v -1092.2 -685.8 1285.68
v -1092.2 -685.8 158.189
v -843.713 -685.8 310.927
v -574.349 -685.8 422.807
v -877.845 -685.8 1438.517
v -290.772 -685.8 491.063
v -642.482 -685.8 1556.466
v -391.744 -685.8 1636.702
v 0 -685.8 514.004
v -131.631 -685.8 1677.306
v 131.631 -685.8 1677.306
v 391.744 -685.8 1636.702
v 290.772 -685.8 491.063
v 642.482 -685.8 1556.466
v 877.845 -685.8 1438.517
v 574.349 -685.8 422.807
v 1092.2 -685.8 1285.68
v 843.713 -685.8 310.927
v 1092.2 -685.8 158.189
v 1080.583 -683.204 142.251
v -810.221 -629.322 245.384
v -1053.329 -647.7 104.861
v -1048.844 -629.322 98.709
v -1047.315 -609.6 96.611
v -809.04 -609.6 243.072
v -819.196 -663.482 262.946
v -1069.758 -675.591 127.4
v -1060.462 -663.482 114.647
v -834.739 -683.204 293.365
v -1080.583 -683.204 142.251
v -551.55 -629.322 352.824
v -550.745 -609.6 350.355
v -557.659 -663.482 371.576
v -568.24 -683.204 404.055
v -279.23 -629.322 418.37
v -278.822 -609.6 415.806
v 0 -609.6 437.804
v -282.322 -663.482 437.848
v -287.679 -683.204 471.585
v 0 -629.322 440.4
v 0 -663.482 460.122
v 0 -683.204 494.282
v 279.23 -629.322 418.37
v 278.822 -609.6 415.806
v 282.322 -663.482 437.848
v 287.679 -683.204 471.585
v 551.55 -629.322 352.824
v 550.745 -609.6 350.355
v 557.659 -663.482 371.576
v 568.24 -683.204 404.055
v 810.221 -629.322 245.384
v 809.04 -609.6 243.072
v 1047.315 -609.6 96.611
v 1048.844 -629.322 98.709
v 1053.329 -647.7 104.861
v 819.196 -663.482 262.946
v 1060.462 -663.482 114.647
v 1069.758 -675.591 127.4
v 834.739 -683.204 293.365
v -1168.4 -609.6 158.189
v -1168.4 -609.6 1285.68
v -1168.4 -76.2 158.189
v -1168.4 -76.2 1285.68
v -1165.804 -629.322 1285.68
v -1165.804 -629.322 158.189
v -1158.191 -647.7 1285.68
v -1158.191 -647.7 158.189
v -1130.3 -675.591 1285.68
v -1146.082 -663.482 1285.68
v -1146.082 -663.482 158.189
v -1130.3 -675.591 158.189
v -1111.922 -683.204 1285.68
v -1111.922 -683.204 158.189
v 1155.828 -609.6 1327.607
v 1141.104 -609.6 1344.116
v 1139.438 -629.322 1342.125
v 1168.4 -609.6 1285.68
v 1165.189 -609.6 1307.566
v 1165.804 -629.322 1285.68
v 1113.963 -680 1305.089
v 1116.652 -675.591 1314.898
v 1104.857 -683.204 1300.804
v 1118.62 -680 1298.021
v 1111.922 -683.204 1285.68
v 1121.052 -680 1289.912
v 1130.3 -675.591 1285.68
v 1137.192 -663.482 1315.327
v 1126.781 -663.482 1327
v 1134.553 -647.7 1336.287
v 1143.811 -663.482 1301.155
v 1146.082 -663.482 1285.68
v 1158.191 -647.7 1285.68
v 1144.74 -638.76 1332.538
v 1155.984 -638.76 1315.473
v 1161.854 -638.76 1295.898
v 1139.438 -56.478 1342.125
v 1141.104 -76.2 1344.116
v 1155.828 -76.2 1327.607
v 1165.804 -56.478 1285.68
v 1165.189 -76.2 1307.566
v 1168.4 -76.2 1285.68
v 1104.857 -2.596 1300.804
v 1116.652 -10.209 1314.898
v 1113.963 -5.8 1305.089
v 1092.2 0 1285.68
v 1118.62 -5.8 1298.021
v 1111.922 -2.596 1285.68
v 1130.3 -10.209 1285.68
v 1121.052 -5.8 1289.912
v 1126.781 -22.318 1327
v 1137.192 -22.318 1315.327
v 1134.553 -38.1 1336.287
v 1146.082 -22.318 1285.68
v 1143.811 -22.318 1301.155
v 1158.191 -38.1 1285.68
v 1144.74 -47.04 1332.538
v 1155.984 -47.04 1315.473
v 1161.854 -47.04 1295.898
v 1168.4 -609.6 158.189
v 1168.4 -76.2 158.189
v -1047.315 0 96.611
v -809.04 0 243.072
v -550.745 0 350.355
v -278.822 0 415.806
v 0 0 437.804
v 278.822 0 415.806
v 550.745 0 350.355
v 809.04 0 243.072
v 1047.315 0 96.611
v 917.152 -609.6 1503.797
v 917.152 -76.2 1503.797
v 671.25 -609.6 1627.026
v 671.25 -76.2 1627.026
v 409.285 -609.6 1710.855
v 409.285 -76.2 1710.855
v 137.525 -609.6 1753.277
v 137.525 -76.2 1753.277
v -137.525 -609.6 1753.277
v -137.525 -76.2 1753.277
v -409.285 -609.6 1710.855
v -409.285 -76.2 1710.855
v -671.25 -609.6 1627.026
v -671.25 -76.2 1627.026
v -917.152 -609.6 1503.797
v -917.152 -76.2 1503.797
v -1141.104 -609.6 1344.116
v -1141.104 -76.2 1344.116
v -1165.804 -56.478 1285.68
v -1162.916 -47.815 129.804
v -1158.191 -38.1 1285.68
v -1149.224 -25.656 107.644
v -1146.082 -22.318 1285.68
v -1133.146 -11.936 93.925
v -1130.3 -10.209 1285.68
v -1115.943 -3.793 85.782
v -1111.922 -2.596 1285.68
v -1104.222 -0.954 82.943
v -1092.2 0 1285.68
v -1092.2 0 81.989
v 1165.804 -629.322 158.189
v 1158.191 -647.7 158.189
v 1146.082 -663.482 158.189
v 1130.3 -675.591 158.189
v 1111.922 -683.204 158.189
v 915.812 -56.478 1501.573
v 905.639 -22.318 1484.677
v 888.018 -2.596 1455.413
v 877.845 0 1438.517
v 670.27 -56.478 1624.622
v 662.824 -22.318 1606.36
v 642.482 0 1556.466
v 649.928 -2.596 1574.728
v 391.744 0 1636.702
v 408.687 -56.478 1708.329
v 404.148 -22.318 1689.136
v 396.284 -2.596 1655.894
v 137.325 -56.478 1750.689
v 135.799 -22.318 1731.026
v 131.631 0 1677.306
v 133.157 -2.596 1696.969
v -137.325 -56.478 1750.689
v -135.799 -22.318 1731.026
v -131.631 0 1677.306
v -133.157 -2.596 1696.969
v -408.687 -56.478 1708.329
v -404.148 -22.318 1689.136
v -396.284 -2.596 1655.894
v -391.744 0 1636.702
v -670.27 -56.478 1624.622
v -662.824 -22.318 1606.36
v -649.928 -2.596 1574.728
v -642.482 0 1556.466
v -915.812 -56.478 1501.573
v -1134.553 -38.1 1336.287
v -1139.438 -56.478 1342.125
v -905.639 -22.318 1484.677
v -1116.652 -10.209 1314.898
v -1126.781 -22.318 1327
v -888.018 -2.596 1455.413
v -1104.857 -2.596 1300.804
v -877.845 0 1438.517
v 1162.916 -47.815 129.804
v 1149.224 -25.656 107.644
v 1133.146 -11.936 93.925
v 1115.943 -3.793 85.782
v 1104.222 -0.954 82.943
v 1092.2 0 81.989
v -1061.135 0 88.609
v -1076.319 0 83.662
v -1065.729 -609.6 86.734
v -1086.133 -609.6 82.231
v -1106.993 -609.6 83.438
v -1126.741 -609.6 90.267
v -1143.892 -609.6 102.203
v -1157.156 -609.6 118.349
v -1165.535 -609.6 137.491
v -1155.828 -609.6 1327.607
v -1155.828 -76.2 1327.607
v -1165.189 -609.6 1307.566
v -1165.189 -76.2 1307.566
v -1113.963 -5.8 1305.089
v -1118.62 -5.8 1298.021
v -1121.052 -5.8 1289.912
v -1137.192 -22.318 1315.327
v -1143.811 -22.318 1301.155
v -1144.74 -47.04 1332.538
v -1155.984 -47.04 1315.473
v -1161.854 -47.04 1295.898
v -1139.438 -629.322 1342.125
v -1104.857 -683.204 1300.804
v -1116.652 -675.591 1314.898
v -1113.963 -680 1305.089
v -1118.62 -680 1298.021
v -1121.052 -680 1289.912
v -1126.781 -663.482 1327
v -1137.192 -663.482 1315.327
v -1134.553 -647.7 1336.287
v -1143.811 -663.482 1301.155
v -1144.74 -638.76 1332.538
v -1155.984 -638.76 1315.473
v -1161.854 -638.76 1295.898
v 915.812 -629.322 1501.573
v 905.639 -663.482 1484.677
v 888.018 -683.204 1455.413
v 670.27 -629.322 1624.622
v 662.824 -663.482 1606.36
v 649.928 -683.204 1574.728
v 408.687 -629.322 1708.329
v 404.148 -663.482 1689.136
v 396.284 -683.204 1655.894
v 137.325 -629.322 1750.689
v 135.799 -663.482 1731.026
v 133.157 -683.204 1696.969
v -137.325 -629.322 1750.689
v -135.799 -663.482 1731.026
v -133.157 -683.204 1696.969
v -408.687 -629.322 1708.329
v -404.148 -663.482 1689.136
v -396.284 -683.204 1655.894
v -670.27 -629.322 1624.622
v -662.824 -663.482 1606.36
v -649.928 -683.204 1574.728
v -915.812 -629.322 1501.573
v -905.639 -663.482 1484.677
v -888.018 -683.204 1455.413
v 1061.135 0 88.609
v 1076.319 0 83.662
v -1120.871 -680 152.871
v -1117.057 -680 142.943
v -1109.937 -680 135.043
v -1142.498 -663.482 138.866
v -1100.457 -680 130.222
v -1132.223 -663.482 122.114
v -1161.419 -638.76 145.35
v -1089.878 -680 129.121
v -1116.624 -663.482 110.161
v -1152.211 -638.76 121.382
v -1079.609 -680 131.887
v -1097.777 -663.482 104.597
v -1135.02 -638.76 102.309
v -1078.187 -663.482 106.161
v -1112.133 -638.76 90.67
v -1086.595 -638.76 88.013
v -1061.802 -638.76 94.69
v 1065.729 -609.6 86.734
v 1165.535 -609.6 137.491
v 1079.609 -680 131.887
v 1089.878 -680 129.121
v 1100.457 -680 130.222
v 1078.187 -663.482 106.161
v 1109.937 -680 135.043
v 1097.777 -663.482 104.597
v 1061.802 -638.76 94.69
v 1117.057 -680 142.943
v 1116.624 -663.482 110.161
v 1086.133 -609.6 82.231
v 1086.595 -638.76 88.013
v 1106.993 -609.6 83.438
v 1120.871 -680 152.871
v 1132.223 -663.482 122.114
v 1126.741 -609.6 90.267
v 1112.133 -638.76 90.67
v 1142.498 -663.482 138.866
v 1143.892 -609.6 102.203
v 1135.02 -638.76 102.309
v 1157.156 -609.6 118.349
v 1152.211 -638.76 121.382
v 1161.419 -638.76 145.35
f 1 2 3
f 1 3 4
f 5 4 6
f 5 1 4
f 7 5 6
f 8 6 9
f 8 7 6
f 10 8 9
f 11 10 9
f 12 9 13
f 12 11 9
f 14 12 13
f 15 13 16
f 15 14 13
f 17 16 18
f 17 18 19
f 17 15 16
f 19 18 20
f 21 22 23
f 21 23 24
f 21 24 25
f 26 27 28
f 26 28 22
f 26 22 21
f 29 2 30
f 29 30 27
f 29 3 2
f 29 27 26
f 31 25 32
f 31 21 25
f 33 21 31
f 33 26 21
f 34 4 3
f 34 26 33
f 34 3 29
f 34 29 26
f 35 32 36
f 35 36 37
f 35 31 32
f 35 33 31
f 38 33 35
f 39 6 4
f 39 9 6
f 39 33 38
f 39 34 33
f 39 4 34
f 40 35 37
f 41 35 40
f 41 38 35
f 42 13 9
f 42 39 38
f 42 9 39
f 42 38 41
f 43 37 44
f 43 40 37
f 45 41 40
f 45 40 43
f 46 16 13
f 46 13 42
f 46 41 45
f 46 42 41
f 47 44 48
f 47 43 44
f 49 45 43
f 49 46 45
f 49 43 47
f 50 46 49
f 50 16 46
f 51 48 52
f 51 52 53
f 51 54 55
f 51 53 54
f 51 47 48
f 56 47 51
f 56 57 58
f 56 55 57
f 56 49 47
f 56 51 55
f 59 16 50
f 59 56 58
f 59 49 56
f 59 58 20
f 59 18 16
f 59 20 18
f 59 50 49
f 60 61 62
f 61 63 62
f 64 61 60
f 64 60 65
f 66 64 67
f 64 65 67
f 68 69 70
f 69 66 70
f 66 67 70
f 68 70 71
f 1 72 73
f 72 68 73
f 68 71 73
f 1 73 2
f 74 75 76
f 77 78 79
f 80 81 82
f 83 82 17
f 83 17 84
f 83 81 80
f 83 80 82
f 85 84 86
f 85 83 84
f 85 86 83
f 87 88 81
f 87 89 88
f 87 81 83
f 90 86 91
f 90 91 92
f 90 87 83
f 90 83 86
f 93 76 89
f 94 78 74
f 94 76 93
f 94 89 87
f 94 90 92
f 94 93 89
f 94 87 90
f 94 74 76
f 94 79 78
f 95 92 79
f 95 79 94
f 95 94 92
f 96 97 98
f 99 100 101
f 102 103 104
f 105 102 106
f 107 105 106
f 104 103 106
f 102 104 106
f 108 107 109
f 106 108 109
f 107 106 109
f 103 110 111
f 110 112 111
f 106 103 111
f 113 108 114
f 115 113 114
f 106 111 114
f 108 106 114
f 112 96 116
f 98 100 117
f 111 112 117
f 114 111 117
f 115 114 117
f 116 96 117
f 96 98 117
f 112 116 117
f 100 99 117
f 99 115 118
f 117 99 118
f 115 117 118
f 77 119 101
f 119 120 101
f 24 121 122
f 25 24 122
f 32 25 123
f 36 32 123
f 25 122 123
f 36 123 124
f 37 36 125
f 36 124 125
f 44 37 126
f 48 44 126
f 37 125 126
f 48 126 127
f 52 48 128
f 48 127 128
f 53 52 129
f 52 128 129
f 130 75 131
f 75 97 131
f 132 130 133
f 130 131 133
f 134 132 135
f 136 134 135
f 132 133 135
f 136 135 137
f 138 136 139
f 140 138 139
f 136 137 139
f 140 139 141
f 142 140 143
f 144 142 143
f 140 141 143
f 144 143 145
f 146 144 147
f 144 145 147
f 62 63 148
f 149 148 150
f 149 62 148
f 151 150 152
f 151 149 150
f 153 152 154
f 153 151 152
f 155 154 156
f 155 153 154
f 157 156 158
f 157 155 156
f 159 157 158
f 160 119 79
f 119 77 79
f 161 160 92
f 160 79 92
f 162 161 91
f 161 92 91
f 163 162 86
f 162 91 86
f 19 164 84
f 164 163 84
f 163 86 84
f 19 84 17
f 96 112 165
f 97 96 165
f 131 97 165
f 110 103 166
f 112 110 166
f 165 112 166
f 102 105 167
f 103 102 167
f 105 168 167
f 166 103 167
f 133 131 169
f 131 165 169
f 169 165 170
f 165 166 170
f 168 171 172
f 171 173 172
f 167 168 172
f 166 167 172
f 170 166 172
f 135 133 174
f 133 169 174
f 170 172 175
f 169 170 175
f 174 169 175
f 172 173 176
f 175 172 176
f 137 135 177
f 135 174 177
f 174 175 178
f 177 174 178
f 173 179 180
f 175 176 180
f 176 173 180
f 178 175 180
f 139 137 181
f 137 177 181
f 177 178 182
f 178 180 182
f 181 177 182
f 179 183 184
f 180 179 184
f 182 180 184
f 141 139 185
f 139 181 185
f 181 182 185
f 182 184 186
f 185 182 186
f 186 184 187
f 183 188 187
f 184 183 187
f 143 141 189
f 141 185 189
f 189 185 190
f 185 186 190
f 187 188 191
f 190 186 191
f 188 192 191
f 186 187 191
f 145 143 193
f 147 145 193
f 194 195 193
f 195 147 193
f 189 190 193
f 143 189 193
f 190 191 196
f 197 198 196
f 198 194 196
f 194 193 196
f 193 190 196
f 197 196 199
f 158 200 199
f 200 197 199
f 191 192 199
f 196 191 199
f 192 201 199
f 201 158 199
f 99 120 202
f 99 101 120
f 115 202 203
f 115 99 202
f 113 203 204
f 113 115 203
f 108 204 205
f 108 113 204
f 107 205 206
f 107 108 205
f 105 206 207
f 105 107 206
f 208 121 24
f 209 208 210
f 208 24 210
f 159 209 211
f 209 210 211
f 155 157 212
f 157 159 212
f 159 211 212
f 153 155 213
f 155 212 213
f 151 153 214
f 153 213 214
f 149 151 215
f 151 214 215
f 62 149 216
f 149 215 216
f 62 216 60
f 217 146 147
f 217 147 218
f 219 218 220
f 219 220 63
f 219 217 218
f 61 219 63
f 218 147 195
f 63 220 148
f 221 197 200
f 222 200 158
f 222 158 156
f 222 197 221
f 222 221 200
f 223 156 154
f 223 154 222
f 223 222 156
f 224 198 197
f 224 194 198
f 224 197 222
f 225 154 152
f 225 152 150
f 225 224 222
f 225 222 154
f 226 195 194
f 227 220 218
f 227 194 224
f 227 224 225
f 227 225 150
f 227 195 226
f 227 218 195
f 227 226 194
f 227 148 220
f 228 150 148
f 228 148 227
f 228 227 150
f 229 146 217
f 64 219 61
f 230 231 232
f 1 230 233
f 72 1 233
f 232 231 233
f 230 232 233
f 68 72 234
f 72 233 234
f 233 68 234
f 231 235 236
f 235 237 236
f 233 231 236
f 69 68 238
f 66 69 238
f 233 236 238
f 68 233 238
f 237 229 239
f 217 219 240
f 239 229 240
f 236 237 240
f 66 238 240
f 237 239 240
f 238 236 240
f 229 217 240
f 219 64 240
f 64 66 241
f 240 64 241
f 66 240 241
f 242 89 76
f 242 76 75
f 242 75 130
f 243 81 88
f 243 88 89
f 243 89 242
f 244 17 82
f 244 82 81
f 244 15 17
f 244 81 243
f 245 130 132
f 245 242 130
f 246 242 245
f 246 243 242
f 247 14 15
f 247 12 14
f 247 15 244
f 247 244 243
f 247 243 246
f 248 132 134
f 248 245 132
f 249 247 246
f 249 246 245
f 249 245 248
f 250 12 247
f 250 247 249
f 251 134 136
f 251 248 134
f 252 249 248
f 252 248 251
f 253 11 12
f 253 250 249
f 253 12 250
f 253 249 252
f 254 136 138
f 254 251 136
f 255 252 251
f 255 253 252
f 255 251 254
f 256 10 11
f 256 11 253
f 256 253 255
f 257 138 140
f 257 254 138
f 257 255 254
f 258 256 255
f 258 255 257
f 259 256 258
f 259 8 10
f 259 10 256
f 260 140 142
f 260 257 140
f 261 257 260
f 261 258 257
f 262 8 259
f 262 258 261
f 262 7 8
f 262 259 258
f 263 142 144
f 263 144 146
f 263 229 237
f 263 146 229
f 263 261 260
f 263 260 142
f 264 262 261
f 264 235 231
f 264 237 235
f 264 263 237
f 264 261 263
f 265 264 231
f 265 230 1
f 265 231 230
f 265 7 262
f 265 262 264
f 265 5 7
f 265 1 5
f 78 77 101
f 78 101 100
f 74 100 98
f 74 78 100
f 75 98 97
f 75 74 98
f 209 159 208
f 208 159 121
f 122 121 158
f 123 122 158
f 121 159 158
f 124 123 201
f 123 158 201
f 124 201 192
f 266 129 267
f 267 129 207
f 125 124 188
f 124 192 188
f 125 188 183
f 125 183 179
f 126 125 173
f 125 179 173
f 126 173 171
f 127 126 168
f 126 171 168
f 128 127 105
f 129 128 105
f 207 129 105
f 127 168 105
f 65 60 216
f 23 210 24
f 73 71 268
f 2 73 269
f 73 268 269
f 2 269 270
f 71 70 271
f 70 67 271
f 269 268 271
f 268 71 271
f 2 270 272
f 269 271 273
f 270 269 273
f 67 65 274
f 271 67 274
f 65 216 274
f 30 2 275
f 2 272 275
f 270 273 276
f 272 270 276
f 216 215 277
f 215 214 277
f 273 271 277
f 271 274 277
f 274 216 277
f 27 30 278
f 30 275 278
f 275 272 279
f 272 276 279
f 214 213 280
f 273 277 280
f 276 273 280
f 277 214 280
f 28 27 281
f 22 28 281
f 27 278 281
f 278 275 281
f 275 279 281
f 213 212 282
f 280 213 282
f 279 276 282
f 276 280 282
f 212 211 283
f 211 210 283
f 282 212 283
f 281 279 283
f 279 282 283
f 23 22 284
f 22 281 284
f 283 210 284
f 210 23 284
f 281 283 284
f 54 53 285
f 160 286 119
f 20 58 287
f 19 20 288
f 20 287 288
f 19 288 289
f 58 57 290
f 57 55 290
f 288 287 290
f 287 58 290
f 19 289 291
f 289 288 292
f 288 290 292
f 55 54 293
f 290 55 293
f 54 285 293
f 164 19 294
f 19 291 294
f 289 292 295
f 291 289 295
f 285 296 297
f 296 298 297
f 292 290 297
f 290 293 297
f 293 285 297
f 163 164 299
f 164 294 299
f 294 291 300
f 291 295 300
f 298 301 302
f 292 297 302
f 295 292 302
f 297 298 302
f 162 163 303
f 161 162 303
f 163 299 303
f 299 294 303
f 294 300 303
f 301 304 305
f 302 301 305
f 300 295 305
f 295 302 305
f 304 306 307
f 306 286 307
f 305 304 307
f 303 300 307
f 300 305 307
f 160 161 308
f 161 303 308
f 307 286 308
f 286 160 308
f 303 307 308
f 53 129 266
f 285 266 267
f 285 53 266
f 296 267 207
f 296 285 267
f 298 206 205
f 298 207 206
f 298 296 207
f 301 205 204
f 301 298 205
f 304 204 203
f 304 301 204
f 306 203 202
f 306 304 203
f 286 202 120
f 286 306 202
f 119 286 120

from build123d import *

# Parameters (mm, degrees)
F1_DEPTH = 685.8
F2_R     = 76.2


with BuildPart() as f1:
    # F0 (on Front) → F1 (new body)
    with BuildSketch(Plane.XZ):
        with BuildLine():
            ThreePointArc((-1168.4, 0), (0, 437.803955), (1168.4, 0))
            Line((1168.4, 0), (1168.4, 1320.8))
            ThreePointArc((1168.4, 1320.8), (0, 1758.603955), (-1168.4, 1320.8))
            Line((-1168.4, 1320.8), (-1168.4, 0))
        make_face()
    extrude(amount=F1_DEPTH)

    # F2
    f2_edges = [f1.edges().sort_by_distance(p)[0] for p in [
        (0, -685.8, 1758.603955),
        (-1168.4, -685.8, 660.4),
        (0, -685.8, 437.803955),
        (1168.4, -685.8, 660.4),
        (1168.4, -342.9, 1320.8),
        (-1168.4, -342.9, 1320.8),
        (0, 0, 1758.603955),
        (1168.4, -342.9, 0),
        (1168.4, 0, 660.4),
        (-1168.4, -342.9, 0),
        (-1168.4, 0, 660.4),
    ]]
    fillet(f2_edges, radius=F2_R)


solid = f1.part
